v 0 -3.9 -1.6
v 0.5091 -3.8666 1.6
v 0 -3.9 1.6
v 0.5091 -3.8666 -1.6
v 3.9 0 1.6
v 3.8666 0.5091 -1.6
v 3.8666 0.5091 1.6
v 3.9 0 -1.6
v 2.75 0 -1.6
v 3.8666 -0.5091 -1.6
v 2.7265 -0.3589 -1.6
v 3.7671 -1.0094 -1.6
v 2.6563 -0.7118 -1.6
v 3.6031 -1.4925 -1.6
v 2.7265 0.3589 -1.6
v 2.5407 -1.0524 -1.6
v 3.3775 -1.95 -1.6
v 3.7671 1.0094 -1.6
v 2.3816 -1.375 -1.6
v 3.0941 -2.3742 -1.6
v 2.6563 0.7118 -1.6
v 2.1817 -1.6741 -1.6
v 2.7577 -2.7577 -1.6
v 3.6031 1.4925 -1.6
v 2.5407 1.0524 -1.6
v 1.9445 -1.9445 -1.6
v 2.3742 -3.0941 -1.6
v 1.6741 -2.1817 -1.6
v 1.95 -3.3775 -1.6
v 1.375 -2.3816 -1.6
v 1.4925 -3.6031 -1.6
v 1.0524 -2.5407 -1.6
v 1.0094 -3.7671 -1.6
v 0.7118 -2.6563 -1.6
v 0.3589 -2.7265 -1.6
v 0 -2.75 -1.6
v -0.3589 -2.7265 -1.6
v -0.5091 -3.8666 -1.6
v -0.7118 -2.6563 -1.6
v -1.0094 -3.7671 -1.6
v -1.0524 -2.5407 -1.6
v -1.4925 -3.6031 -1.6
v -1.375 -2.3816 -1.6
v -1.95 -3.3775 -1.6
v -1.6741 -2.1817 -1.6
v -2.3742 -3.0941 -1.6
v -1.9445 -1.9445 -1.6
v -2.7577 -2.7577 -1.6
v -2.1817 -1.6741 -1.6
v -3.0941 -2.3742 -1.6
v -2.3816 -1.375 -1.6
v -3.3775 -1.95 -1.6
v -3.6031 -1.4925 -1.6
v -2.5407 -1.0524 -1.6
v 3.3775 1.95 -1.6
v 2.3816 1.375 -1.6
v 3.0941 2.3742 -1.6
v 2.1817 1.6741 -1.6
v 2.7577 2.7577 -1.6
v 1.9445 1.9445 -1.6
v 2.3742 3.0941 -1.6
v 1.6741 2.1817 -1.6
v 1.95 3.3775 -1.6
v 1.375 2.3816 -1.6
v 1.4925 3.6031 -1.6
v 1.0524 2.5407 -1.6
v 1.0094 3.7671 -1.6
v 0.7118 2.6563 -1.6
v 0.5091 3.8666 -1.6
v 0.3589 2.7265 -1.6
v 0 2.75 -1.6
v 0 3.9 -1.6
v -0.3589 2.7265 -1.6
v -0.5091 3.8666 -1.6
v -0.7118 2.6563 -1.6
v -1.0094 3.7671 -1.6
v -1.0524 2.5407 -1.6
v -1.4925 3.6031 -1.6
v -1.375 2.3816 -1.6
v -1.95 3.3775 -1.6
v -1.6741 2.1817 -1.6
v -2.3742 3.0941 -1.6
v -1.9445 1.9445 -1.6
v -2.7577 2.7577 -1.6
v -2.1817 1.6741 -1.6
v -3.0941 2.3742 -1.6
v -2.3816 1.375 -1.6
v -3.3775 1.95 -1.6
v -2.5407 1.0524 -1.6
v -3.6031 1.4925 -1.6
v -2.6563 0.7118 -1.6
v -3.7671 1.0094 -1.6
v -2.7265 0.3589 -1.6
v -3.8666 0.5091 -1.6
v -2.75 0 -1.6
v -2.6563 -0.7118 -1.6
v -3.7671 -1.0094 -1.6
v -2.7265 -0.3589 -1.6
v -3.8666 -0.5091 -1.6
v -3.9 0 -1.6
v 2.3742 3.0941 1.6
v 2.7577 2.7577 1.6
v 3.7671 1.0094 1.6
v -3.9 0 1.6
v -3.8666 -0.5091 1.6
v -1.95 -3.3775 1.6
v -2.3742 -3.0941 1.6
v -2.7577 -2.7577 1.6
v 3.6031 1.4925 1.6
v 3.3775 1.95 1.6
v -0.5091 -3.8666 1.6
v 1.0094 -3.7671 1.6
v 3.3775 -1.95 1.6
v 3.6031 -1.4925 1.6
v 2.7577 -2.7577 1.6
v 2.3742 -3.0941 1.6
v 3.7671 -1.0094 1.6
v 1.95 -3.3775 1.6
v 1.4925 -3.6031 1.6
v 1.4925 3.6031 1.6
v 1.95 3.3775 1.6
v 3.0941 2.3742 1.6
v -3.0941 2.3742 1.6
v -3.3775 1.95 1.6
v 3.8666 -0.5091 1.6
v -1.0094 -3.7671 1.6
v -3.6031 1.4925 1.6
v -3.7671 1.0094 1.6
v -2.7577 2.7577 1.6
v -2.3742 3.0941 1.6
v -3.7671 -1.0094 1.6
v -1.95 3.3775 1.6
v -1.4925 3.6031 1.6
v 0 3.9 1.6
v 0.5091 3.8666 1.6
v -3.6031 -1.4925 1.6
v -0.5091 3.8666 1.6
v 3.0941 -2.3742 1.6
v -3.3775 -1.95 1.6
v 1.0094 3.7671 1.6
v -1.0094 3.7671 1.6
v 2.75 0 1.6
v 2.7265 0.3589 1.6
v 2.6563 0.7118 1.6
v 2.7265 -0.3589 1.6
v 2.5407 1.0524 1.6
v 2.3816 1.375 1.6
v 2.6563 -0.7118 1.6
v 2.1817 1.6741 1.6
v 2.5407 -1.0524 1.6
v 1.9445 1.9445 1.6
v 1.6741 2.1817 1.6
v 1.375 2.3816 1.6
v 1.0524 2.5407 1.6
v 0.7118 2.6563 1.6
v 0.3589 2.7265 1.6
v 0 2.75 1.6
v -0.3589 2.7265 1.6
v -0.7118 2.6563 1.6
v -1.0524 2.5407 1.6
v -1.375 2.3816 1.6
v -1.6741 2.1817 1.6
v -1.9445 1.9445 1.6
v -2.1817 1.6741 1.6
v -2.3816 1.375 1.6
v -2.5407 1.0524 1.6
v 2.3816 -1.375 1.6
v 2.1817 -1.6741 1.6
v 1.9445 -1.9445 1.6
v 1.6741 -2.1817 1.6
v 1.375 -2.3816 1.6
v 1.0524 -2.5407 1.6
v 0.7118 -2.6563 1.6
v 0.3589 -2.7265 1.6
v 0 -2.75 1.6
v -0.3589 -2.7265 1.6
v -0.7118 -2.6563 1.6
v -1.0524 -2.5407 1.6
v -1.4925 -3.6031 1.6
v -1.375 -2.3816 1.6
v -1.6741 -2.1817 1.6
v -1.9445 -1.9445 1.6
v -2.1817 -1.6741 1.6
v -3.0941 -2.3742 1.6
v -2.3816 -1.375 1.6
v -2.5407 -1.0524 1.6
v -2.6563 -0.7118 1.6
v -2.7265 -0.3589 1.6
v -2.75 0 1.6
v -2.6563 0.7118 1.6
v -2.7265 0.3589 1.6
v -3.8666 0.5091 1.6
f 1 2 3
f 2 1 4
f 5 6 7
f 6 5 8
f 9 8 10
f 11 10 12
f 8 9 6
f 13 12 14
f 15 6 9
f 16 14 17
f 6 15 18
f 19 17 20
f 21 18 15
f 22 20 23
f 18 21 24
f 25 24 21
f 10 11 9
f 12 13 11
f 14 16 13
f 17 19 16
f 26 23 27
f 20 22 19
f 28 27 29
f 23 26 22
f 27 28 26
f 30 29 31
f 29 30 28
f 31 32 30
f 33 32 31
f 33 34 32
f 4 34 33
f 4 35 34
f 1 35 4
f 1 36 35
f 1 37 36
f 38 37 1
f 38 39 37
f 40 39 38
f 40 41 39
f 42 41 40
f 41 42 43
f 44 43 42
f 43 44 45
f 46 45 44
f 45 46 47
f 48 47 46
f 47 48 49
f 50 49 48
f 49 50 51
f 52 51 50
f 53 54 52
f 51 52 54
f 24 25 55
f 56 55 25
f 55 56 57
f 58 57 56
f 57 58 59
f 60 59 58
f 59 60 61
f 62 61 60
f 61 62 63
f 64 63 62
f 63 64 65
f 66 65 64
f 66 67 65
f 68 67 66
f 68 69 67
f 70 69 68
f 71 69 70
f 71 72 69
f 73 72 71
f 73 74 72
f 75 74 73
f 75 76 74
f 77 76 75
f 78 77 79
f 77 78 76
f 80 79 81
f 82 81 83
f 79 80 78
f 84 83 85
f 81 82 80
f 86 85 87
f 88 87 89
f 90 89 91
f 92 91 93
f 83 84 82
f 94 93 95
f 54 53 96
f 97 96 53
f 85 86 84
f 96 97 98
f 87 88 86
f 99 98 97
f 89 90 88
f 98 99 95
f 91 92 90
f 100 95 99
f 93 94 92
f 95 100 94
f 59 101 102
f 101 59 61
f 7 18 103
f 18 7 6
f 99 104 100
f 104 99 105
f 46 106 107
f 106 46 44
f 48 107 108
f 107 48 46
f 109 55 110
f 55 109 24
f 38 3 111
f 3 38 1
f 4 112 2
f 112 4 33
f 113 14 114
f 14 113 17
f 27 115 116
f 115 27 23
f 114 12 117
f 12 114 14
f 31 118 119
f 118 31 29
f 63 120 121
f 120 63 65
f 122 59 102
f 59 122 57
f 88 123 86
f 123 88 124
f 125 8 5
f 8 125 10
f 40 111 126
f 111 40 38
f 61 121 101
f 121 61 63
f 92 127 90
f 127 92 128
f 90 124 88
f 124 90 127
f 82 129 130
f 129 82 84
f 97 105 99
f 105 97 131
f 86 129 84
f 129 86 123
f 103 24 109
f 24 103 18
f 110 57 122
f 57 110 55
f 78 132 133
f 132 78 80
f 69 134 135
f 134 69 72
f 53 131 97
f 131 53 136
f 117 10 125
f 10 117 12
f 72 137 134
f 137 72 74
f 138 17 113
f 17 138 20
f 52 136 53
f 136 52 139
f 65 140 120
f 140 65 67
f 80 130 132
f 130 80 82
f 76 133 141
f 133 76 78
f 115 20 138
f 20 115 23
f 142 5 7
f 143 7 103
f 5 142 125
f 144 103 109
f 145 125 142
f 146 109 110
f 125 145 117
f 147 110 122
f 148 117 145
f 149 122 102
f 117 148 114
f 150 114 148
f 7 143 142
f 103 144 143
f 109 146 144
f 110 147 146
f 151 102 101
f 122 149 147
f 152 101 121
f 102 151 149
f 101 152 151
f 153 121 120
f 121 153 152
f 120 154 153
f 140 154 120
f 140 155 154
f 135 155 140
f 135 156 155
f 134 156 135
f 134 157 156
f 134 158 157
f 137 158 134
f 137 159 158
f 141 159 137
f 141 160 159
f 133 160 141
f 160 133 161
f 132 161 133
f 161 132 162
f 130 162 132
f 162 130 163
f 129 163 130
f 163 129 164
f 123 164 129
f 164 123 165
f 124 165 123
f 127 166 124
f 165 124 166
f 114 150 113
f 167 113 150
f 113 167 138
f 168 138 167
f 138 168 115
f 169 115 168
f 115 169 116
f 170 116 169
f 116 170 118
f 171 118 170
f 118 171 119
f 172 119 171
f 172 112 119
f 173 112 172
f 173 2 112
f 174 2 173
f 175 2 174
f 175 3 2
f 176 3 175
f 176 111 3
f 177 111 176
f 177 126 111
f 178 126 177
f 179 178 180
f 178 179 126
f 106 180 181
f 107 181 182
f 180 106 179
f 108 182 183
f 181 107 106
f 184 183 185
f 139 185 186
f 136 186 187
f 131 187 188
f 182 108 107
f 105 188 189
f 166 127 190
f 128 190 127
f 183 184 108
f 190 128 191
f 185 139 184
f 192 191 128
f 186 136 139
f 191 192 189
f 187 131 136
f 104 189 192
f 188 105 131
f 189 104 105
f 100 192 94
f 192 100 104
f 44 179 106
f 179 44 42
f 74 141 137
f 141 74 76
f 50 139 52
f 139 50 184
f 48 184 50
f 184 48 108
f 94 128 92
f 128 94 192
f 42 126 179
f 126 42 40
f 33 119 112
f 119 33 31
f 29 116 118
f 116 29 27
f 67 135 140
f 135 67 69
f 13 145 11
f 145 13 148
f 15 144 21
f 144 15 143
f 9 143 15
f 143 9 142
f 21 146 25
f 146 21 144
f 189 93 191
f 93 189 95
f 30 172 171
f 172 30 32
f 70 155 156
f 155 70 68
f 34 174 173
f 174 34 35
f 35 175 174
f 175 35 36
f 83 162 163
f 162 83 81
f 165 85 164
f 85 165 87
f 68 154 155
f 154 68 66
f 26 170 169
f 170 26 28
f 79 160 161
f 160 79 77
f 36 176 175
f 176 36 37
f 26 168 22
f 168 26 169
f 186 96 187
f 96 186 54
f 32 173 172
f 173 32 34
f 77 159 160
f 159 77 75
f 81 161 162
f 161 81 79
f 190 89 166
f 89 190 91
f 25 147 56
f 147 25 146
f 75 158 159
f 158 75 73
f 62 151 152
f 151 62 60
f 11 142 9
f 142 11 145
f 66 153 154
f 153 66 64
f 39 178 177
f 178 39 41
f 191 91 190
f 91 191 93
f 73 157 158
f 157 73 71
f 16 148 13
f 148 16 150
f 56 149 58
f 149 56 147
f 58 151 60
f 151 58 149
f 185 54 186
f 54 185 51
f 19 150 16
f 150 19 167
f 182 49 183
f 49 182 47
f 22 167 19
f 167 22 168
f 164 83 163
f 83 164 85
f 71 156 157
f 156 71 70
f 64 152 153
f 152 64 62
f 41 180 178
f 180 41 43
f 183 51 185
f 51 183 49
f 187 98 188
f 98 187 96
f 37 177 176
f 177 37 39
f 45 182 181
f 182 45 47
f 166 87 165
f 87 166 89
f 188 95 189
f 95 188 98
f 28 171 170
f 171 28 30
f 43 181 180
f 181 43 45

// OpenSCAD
difference()
{
	cylinder(d=7.8,h=3.2,center=true,$fn=24*2);
	cylinder(d=5.5,h=3.2+0.2,center=true,$fn=24*2);
}
